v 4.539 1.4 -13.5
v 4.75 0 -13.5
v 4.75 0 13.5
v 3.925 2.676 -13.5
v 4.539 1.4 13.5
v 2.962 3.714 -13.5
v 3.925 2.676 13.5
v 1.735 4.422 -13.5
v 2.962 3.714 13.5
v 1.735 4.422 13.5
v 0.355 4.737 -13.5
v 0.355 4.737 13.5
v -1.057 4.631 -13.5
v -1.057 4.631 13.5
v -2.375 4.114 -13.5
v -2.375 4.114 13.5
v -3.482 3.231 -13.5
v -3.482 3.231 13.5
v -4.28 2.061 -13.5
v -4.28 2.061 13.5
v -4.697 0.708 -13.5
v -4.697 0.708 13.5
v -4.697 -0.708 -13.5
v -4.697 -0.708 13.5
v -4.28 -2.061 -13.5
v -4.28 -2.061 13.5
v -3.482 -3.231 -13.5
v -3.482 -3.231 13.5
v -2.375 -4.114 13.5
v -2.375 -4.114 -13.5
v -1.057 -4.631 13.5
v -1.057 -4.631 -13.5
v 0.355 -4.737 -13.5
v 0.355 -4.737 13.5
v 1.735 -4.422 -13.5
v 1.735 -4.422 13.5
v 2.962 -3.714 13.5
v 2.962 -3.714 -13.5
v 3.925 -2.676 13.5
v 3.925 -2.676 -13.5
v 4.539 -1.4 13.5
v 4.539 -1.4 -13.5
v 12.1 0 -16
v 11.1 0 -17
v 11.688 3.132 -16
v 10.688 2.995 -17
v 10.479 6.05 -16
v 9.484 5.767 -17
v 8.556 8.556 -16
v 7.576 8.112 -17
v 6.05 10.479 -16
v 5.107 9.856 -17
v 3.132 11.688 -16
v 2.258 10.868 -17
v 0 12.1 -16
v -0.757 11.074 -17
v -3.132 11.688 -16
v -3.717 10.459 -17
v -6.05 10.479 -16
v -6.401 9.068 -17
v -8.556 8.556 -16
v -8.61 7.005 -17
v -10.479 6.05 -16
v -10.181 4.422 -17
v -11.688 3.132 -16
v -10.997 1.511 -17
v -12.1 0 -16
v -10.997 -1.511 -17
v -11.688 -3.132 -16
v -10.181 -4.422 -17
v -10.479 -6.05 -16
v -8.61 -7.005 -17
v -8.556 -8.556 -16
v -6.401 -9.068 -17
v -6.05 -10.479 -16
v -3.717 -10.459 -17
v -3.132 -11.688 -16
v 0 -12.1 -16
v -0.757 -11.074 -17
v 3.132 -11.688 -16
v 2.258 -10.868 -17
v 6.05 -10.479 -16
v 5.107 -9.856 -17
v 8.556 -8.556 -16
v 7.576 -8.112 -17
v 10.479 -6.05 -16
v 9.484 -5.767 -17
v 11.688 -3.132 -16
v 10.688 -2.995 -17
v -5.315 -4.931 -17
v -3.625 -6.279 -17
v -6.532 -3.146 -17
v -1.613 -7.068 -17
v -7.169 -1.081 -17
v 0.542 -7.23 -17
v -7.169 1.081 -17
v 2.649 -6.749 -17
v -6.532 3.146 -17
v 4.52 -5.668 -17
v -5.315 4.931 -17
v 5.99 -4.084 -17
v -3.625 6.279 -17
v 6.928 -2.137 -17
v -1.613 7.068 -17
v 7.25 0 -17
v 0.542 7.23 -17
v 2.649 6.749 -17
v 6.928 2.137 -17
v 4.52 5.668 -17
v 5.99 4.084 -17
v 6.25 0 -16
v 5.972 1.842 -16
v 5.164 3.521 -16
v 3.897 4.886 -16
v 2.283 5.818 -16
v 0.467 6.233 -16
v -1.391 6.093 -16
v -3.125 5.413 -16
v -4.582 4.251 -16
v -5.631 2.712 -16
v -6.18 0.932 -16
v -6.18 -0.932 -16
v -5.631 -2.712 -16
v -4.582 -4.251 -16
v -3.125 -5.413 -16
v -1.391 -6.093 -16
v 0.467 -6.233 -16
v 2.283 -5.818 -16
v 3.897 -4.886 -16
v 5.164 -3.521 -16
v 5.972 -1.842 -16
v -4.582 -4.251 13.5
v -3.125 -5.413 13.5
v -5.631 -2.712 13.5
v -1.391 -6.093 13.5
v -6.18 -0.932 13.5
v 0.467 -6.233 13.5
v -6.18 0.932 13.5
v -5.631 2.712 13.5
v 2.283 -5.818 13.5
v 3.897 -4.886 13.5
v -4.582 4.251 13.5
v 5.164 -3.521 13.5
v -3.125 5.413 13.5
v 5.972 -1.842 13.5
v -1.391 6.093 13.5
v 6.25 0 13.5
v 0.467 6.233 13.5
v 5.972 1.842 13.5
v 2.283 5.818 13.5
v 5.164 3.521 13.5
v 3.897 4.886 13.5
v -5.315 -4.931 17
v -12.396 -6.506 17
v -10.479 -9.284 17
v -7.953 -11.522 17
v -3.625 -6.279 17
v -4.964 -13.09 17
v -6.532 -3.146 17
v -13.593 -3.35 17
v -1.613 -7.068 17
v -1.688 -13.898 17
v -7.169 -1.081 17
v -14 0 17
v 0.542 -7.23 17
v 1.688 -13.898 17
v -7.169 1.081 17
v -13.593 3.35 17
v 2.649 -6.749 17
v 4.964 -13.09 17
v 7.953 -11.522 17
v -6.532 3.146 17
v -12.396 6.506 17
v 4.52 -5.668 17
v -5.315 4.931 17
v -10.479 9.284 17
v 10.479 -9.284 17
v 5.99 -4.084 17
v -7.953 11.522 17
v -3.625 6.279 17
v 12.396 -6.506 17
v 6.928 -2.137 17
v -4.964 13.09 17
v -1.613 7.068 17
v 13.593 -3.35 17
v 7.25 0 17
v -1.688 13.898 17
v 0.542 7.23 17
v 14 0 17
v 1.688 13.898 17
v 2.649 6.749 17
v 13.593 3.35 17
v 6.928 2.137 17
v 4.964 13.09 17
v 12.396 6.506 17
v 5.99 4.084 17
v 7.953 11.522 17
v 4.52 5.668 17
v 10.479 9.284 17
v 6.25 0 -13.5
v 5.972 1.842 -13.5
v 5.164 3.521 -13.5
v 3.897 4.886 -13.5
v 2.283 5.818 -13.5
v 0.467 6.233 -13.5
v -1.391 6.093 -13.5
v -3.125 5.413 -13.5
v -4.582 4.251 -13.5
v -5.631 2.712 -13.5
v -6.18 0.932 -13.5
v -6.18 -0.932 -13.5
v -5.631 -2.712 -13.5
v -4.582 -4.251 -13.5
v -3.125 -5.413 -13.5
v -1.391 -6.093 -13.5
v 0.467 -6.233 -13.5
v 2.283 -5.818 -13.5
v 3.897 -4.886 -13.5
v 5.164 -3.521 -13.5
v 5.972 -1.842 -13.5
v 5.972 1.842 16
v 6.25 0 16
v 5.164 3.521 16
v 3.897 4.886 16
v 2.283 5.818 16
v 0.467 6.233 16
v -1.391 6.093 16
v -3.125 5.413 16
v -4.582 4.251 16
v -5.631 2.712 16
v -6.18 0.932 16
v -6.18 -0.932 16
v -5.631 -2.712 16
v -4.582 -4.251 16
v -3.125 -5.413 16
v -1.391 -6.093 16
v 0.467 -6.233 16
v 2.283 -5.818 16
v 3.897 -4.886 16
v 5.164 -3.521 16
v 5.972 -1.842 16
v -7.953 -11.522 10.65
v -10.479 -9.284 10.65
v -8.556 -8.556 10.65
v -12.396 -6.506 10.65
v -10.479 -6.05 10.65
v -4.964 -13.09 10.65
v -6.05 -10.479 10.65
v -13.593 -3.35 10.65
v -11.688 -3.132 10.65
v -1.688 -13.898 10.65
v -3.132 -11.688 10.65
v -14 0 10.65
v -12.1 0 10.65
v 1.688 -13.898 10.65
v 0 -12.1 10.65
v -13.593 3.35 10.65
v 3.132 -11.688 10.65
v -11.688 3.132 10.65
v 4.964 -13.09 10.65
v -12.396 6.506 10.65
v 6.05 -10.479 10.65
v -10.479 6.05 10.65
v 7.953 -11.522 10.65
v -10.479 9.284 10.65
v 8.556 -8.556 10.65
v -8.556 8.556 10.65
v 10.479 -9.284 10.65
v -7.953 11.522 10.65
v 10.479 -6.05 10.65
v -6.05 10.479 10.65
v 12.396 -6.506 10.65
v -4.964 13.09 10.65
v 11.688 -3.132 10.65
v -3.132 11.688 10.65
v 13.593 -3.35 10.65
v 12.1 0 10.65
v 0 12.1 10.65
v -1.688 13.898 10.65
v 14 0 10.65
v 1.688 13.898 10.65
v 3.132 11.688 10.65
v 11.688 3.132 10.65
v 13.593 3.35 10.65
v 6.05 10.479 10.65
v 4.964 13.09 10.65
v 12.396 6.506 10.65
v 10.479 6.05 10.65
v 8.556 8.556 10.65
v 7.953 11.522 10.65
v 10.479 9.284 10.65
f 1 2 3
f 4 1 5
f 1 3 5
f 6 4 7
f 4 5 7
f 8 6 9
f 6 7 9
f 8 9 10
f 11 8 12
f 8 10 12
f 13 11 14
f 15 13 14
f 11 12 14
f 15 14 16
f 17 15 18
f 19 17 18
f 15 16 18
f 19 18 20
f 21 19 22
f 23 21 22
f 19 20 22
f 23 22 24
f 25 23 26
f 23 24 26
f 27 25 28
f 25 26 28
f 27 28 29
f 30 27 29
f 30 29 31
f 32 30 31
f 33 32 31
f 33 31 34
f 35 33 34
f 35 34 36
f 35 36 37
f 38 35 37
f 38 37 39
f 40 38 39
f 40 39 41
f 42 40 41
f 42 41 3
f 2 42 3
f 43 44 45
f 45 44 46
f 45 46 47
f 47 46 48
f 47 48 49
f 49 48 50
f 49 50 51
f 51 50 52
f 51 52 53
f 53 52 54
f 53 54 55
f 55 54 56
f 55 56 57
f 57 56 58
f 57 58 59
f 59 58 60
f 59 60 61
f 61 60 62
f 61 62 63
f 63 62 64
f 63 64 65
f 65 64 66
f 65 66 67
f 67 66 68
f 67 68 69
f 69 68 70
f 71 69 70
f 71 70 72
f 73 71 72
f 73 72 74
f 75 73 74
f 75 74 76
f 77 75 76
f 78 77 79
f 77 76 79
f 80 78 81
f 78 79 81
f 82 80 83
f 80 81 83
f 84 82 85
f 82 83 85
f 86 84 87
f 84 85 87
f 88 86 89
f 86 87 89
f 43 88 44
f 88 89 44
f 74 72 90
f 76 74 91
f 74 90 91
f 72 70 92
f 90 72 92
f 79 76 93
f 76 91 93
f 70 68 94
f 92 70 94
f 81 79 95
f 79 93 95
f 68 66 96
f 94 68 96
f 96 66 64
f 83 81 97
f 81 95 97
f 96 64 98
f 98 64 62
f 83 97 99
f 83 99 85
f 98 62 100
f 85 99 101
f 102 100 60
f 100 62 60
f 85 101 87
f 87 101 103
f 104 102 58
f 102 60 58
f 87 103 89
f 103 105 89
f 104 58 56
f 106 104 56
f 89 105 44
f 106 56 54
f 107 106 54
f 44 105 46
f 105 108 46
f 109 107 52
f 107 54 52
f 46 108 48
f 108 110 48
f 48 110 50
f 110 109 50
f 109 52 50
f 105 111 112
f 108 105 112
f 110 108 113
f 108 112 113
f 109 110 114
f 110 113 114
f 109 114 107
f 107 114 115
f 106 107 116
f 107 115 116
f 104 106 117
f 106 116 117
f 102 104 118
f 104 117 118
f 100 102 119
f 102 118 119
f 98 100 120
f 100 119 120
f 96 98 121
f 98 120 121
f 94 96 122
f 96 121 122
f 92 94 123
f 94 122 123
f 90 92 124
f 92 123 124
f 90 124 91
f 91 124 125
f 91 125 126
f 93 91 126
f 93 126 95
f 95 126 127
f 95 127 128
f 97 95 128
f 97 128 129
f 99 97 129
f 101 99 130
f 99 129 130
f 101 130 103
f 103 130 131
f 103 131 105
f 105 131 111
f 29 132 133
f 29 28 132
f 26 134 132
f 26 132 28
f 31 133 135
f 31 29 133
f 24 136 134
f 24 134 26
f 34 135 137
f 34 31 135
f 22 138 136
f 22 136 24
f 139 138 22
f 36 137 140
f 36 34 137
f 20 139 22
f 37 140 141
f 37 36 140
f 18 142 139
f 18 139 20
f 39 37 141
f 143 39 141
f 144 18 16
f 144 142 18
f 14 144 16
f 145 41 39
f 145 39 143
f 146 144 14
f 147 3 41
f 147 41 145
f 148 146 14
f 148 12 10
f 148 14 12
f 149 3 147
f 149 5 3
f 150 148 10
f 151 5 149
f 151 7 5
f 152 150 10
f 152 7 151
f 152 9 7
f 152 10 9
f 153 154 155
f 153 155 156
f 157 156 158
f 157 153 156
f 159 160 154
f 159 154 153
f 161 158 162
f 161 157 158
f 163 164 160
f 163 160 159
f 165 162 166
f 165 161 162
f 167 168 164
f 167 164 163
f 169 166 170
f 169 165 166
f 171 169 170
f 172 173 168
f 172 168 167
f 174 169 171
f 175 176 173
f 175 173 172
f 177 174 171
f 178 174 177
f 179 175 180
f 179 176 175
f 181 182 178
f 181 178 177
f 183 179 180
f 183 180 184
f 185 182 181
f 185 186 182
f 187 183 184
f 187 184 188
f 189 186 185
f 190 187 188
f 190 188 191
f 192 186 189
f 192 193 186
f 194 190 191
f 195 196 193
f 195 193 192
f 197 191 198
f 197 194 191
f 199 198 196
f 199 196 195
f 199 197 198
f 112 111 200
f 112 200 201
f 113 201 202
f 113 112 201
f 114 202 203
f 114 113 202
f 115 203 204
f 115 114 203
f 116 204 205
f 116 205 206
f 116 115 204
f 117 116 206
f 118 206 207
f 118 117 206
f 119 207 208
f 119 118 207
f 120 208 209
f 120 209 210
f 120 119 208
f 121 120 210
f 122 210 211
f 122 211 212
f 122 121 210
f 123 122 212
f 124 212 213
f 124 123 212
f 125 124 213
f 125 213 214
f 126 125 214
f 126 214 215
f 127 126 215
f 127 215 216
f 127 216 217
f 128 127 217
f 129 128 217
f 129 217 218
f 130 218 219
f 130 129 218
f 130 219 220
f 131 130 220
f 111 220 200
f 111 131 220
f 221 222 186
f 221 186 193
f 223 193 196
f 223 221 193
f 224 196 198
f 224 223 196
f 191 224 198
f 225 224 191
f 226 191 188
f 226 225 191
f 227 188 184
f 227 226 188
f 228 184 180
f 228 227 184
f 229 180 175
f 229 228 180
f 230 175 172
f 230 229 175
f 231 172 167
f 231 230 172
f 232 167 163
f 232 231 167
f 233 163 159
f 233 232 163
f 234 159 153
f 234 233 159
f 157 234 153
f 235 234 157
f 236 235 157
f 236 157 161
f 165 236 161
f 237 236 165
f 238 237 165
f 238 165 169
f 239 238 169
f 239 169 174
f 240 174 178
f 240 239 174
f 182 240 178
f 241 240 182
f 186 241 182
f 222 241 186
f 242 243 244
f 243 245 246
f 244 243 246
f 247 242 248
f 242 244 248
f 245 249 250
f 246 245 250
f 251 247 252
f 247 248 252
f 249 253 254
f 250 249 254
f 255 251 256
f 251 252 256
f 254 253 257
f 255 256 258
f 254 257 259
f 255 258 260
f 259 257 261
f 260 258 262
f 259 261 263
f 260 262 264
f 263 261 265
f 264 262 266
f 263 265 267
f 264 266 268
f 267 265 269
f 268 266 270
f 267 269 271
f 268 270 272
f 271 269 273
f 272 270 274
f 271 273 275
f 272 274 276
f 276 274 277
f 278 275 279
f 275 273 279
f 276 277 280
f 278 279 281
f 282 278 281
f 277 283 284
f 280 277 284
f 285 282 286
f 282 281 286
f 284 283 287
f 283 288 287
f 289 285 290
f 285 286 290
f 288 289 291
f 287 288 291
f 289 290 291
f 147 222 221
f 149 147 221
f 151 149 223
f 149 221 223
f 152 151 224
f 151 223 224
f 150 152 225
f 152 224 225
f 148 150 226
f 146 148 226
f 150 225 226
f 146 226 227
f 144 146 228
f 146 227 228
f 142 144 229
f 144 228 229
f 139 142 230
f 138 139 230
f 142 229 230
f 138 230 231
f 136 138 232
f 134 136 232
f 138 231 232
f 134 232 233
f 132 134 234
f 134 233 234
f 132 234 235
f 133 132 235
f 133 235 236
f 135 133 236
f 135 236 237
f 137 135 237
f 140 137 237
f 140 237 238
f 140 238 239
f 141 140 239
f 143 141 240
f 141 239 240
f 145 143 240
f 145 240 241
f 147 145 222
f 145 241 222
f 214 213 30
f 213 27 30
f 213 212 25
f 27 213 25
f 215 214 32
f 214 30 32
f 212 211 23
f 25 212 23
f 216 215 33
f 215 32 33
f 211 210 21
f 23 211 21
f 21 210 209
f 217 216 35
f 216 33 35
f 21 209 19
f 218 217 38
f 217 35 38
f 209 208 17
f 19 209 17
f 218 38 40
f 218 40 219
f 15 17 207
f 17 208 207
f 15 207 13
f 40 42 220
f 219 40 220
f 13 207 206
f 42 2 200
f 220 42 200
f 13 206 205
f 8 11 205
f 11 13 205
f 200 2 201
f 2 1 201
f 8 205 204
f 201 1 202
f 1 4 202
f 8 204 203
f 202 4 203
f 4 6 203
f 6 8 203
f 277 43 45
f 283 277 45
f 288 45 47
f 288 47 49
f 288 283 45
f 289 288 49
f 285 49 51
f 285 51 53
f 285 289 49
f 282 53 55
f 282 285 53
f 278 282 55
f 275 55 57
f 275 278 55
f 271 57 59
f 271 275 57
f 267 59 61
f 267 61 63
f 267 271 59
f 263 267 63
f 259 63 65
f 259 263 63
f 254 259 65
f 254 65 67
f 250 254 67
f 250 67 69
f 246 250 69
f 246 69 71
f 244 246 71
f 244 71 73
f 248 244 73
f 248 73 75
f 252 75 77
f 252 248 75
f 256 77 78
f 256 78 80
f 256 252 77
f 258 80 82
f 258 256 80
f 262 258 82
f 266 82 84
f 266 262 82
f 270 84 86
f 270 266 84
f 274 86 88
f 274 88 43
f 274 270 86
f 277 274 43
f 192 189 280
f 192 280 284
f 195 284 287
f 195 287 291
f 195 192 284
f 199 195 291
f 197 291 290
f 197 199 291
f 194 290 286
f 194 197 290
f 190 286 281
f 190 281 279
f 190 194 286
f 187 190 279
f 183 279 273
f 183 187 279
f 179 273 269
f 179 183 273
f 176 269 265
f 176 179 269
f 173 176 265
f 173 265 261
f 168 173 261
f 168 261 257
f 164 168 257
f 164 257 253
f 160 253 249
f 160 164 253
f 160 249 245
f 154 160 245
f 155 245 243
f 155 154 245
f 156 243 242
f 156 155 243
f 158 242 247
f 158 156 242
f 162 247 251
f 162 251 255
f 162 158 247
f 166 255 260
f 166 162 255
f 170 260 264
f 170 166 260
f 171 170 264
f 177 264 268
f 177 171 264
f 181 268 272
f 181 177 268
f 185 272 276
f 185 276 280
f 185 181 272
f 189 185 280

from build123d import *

# Parameters (mm, degrees)
SKETCH1_R           = 12.1
BOSS_EXTRUDE1_DEPTH = 17
SKETCH2_R           = 4.75
CUT_EXTRUDE1_DEPTH  = 39.063368217
SKETCH3_R           = 6.25
CUT_EXTRUDE2_DEPTH  = 3.5
SKETCH4_R           = 14
SKETCH4_R_2         = 12.1
SKETCH4_R_3         = 6.25
BOSS_EXTRUDE2_DEPTH = 6.35
CHAMFER1_SIZE       = 1


with BuildPart() as part:
    # Sketch1 → Boss-Extrude1 (new, symmetric)
    with BuildSketch(Plane.XY):
        Circle(SKETCH1_R)
    extrude(amount=BOSS_EXTRUDE1_DEPTH, both=True)

    # Sketch2 → Cut-Extrude1 (cut, through all)
    with BuildSketch(Plane.XY.offset(17)):
        Circle(SKETCH2_R)
    extrude(amount=-CUT_EXTRUDE1_DEPTH, mode=Mode.SUBTRACT)

    # Sketch3 → Cut-Extrude2 (cut)
    with BuildSketch(Plane.XY.offset(17)):
        Circle(SKETCH3_R)
    cut_extrude2 = extrude(amount=-CUT_EXTRUDE2_DEPTH, mode=Mode.SUBTRACT)

    # Mirror1: Cut-Extrude2 across plane
    add(cut_extrude2.mirror(Plane.XY), mode=Mode.SUBTRACT)

    # Sketch4 → Boss-Extrude2 (add)
    # profile 1 of 2: a face of its own
    with BuildSketch(Plane.XY.offset(17)):
        Circle(SKETCH4_R)
        Circle(SKETCH4_R_2, mode=Mode.SUBTRACT)
    # profile 2 of 2: a face of its own
    with BuildSketch(Plane.XY.offset(17)):
        Circle(SKETCH4_R_2)
        Circle(SKETCH4_R_3, mode=Mode.SUBTRACT)
    extrude(amount=-BOSS_EXTRUDE2_DEPTH)

    # Chamfer1
    chamfer1_edges = [part.edges().sort_by_distance(p)[0] for p in [
        (-6.25, 0, 17),
        (-6.25, 0, -17),
        (-12.1, 0, -17),
    ]]
    chamfer(chamfer1_edges, length=CHAMFER1_SIZE)


solid = part.part
